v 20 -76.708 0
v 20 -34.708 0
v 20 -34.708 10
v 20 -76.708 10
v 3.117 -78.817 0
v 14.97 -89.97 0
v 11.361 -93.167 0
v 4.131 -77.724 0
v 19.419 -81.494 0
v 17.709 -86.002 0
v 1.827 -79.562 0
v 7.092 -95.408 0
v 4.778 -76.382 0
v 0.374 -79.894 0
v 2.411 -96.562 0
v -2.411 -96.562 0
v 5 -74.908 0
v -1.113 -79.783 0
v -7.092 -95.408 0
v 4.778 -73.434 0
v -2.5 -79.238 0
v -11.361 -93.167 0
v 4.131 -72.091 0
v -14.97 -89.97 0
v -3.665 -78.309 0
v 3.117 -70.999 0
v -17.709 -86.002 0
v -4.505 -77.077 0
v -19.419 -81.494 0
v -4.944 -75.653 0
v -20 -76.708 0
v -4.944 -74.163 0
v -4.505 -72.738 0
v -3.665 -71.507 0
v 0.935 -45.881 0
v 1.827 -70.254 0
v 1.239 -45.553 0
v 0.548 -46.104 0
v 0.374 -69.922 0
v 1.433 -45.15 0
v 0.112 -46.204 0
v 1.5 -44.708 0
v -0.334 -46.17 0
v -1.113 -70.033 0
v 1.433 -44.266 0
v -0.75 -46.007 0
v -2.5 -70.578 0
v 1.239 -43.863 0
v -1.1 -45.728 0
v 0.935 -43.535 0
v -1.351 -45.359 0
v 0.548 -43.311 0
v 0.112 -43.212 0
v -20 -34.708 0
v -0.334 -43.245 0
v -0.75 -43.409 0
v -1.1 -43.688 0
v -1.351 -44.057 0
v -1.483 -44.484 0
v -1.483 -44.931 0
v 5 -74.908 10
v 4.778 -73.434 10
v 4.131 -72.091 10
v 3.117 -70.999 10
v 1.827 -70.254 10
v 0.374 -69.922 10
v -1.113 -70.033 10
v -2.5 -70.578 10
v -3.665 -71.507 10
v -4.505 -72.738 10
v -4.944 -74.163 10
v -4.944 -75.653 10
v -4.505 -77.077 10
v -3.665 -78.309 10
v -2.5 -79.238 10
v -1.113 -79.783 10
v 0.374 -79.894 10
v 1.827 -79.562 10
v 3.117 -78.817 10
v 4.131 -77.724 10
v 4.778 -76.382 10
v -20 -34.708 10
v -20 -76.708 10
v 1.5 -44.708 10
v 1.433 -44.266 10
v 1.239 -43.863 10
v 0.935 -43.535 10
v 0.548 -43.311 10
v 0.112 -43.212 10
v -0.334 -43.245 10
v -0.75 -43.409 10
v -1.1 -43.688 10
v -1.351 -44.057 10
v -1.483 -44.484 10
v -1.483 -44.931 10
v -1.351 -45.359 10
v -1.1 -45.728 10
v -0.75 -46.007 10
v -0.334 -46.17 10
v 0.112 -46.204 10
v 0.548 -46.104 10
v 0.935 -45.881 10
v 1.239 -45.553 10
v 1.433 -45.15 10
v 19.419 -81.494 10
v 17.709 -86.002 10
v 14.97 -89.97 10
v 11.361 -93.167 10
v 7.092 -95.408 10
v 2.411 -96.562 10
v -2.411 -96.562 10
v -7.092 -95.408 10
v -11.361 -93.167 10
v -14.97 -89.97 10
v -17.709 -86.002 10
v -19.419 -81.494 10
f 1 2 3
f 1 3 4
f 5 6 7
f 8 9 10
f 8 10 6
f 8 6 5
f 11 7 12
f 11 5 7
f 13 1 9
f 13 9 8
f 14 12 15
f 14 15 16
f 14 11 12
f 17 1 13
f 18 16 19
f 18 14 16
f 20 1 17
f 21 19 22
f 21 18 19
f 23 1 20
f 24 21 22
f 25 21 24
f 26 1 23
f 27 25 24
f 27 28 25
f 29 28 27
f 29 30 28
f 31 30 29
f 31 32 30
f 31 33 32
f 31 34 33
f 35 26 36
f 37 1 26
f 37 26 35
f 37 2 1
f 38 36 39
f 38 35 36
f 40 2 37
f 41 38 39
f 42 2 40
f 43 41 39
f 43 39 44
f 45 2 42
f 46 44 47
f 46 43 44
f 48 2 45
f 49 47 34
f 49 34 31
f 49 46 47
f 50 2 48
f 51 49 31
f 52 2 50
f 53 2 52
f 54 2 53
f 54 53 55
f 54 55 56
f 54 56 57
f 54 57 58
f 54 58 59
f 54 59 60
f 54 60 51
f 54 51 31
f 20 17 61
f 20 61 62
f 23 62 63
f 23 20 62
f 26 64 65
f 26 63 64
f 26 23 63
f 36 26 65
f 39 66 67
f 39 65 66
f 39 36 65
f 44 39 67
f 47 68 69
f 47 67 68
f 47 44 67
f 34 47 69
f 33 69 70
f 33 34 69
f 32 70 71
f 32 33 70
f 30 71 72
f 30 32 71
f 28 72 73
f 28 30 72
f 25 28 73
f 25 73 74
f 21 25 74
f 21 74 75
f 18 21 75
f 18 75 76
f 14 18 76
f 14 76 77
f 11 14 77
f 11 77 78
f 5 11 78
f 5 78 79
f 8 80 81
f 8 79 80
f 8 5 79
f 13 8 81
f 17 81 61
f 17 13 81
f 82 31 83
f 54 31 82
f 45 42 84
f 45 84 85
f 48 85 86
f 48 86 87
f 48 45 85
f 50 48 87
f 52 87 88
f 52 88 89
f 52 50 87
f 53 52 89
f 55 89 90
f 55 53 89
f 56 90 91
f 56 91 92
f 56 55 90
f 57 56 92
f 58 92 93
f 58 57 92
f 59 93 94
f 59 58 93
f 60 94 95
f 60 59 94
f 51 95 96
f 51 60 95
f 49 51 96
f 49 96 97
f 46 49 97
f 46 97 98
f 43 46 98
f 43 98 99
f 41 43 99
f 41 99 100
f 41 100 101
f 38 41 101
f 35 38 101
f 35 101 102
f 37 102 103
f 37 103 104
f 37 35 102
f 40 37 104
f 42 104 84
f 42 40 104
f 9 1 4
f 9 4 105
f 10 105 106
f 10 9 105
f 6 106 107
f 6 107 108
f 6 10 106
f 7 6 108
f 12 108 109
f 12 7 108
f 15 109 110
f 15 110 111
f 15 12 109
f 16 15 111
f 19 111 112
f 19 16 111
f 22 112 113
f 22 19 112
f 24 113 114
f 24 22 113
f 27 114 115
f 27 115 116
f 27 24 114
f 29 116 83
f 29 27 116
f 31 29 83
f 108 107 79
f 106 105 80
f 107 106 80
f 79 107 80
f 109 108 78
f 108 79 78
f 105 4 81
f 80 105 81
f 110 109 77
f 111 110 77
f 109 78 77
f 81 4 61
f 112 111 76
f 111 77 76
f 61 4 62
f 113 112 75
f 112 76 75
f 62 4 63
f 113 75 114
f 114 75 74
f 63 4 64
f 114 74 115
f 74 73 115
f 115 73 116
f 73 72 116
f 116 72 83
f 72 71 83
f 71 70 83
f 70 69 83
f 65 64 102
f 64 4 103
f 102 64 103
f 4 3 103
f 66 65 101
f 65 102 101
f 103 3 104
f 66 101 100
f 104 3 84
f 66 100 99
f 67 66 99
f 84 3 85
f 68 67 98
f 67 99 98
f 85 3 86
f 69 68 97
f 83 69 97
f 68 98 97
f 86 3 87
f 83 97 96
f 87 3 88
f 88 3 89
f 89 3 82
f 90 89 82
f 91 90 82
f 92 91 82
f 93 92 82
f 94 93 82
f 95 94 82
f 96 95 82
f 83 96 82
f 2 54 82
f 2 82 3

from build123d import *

# Parameters (mm, degrees)
SKETCH1_R               = 1.5
BOSS_EXTRUDE1_DEPTH     = 10
CUT_EXTRUDE1_DEPTH      = 37
CUT_EXTRUDE1_DEPTH_BACK = 24
SKETCH2_R               = 5
CUT_EXTRUDE2_DEPTH      = 27
CUT_EXTRUDE2_DEPTH_BACK = 19
SKETCH3_W               = 102.676723454
SKETCH3_H               = 43.006638415


with BuildPart() as part:
    # Sketch1 → Boss-Extrude1 (new body)
    with BuildSketch(Plane.XY):
        with BuildLine():
            Line((-20, -76.707766284), (-20, -58.504148974))
            Line((-20, -58.504148974), (-120, -58.504148974))
            Line((-120, -58.504148974), (-120, -33.504148974))
            Line((-120, -33.504148974), (-20, -34.707766284))
            Line((-20, -34.707766284), (20, -34.707766284))
            Line((20, -34.707766284), (20, -76.707766284))
            ThreePointArc((20, -76.707766284), (0, -96.707766284), (-20, -76.707766284))
        make_face()
        with Locations((0, -44.707766284)):
            Circle(SKETCH1_R, mode=Mode.SUBTRACT)
        with Locations((-100, -43.745596757)):
            Circle(SKETCH1_R, mode=Mode.SUBTRACT)
    extrude(amount=BOSS_EXTRUDE1_DEPTH)

    # Sketch2 → Cut-Extrude1 (cut, two sides: drawn at the far end of the back side and taken through both)
    with BuildSketch(Plane.XY.offset(10).offset(-CUT_EXTRUDE1_DEPTH_BACK)):
        with Locations((0, -74.90788056)):
            Circle(SKETCH2_R)
    extrude(amount=CUT_EXTRUDE1_DEPTH + CUT_EXTRUDE1_DEPTH_BACK, mode=Mode.SUBTRACT)

    # Sketch3 → Cut-Extrude2 (cut, two sides: drawn at the far end of the back side and taken through both)
    with BuildSketch(Plane.XY.offset(-CUT_EXTRUDE2_DEPTH_BACK)):
        with Locations((-71.338361727, -50.195990653)):
            Rectangle(SKETCH3_W, SKETCH3_H)
    extrude(amount=CUT_EXTRUDE2_DEPTH + CUT_EXTRUDE2_DEPTH_BACK, mode=Mode.SUBTRACT)


solid = part.part
